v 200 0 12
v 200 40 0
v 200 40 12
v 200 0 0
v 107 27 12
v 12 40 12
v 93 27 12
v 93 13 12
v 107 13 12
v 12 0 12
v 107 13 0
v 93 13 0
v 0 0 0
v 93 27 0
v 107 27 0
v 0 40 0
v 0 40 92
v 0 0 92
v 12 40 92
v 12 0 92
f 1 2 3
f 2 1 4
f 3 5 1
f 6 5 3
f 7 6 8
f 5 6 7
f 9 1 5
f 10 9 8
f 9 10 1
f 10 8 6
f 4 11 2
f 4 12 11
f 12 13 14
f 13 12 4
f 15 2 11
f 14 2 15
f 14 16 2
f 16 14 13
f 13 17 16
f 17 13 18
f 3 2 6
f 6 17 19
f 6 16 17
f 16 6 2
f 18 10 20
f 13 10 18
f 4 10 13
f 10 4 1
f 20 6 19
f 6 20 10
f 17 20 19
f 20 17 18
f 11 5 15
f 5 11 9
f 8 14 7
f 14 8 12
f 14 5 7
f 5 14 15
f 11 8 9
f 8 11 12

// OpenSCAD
$fn = 32;

// ----------------------------------------------------------------------
// Gantry bracket: 200-250 mm L bracket
// ----------------------------------------------------------------------

// --- parameters (mm) ---
base_l = 200;             // base arm length, X
arm_w = 40;               // arm width, Y
thick = 12;               // arm thickness
up_h = 80;                // vertical arm height, Z
slot_w = 14;              // adjustment slot width in the base

total_h = up_h + thick;  // overall height

difference() {
  union() {
    cube([base_l, arm_w, thick]);
    cube([thick, arm_w, total_h]);
  }
  translate([base_l / 2 - slot_w / 2, arm_w / 2 - slot_w / 2, -1])
    cube([slot_w, slot_w, thick + 2]);
}
